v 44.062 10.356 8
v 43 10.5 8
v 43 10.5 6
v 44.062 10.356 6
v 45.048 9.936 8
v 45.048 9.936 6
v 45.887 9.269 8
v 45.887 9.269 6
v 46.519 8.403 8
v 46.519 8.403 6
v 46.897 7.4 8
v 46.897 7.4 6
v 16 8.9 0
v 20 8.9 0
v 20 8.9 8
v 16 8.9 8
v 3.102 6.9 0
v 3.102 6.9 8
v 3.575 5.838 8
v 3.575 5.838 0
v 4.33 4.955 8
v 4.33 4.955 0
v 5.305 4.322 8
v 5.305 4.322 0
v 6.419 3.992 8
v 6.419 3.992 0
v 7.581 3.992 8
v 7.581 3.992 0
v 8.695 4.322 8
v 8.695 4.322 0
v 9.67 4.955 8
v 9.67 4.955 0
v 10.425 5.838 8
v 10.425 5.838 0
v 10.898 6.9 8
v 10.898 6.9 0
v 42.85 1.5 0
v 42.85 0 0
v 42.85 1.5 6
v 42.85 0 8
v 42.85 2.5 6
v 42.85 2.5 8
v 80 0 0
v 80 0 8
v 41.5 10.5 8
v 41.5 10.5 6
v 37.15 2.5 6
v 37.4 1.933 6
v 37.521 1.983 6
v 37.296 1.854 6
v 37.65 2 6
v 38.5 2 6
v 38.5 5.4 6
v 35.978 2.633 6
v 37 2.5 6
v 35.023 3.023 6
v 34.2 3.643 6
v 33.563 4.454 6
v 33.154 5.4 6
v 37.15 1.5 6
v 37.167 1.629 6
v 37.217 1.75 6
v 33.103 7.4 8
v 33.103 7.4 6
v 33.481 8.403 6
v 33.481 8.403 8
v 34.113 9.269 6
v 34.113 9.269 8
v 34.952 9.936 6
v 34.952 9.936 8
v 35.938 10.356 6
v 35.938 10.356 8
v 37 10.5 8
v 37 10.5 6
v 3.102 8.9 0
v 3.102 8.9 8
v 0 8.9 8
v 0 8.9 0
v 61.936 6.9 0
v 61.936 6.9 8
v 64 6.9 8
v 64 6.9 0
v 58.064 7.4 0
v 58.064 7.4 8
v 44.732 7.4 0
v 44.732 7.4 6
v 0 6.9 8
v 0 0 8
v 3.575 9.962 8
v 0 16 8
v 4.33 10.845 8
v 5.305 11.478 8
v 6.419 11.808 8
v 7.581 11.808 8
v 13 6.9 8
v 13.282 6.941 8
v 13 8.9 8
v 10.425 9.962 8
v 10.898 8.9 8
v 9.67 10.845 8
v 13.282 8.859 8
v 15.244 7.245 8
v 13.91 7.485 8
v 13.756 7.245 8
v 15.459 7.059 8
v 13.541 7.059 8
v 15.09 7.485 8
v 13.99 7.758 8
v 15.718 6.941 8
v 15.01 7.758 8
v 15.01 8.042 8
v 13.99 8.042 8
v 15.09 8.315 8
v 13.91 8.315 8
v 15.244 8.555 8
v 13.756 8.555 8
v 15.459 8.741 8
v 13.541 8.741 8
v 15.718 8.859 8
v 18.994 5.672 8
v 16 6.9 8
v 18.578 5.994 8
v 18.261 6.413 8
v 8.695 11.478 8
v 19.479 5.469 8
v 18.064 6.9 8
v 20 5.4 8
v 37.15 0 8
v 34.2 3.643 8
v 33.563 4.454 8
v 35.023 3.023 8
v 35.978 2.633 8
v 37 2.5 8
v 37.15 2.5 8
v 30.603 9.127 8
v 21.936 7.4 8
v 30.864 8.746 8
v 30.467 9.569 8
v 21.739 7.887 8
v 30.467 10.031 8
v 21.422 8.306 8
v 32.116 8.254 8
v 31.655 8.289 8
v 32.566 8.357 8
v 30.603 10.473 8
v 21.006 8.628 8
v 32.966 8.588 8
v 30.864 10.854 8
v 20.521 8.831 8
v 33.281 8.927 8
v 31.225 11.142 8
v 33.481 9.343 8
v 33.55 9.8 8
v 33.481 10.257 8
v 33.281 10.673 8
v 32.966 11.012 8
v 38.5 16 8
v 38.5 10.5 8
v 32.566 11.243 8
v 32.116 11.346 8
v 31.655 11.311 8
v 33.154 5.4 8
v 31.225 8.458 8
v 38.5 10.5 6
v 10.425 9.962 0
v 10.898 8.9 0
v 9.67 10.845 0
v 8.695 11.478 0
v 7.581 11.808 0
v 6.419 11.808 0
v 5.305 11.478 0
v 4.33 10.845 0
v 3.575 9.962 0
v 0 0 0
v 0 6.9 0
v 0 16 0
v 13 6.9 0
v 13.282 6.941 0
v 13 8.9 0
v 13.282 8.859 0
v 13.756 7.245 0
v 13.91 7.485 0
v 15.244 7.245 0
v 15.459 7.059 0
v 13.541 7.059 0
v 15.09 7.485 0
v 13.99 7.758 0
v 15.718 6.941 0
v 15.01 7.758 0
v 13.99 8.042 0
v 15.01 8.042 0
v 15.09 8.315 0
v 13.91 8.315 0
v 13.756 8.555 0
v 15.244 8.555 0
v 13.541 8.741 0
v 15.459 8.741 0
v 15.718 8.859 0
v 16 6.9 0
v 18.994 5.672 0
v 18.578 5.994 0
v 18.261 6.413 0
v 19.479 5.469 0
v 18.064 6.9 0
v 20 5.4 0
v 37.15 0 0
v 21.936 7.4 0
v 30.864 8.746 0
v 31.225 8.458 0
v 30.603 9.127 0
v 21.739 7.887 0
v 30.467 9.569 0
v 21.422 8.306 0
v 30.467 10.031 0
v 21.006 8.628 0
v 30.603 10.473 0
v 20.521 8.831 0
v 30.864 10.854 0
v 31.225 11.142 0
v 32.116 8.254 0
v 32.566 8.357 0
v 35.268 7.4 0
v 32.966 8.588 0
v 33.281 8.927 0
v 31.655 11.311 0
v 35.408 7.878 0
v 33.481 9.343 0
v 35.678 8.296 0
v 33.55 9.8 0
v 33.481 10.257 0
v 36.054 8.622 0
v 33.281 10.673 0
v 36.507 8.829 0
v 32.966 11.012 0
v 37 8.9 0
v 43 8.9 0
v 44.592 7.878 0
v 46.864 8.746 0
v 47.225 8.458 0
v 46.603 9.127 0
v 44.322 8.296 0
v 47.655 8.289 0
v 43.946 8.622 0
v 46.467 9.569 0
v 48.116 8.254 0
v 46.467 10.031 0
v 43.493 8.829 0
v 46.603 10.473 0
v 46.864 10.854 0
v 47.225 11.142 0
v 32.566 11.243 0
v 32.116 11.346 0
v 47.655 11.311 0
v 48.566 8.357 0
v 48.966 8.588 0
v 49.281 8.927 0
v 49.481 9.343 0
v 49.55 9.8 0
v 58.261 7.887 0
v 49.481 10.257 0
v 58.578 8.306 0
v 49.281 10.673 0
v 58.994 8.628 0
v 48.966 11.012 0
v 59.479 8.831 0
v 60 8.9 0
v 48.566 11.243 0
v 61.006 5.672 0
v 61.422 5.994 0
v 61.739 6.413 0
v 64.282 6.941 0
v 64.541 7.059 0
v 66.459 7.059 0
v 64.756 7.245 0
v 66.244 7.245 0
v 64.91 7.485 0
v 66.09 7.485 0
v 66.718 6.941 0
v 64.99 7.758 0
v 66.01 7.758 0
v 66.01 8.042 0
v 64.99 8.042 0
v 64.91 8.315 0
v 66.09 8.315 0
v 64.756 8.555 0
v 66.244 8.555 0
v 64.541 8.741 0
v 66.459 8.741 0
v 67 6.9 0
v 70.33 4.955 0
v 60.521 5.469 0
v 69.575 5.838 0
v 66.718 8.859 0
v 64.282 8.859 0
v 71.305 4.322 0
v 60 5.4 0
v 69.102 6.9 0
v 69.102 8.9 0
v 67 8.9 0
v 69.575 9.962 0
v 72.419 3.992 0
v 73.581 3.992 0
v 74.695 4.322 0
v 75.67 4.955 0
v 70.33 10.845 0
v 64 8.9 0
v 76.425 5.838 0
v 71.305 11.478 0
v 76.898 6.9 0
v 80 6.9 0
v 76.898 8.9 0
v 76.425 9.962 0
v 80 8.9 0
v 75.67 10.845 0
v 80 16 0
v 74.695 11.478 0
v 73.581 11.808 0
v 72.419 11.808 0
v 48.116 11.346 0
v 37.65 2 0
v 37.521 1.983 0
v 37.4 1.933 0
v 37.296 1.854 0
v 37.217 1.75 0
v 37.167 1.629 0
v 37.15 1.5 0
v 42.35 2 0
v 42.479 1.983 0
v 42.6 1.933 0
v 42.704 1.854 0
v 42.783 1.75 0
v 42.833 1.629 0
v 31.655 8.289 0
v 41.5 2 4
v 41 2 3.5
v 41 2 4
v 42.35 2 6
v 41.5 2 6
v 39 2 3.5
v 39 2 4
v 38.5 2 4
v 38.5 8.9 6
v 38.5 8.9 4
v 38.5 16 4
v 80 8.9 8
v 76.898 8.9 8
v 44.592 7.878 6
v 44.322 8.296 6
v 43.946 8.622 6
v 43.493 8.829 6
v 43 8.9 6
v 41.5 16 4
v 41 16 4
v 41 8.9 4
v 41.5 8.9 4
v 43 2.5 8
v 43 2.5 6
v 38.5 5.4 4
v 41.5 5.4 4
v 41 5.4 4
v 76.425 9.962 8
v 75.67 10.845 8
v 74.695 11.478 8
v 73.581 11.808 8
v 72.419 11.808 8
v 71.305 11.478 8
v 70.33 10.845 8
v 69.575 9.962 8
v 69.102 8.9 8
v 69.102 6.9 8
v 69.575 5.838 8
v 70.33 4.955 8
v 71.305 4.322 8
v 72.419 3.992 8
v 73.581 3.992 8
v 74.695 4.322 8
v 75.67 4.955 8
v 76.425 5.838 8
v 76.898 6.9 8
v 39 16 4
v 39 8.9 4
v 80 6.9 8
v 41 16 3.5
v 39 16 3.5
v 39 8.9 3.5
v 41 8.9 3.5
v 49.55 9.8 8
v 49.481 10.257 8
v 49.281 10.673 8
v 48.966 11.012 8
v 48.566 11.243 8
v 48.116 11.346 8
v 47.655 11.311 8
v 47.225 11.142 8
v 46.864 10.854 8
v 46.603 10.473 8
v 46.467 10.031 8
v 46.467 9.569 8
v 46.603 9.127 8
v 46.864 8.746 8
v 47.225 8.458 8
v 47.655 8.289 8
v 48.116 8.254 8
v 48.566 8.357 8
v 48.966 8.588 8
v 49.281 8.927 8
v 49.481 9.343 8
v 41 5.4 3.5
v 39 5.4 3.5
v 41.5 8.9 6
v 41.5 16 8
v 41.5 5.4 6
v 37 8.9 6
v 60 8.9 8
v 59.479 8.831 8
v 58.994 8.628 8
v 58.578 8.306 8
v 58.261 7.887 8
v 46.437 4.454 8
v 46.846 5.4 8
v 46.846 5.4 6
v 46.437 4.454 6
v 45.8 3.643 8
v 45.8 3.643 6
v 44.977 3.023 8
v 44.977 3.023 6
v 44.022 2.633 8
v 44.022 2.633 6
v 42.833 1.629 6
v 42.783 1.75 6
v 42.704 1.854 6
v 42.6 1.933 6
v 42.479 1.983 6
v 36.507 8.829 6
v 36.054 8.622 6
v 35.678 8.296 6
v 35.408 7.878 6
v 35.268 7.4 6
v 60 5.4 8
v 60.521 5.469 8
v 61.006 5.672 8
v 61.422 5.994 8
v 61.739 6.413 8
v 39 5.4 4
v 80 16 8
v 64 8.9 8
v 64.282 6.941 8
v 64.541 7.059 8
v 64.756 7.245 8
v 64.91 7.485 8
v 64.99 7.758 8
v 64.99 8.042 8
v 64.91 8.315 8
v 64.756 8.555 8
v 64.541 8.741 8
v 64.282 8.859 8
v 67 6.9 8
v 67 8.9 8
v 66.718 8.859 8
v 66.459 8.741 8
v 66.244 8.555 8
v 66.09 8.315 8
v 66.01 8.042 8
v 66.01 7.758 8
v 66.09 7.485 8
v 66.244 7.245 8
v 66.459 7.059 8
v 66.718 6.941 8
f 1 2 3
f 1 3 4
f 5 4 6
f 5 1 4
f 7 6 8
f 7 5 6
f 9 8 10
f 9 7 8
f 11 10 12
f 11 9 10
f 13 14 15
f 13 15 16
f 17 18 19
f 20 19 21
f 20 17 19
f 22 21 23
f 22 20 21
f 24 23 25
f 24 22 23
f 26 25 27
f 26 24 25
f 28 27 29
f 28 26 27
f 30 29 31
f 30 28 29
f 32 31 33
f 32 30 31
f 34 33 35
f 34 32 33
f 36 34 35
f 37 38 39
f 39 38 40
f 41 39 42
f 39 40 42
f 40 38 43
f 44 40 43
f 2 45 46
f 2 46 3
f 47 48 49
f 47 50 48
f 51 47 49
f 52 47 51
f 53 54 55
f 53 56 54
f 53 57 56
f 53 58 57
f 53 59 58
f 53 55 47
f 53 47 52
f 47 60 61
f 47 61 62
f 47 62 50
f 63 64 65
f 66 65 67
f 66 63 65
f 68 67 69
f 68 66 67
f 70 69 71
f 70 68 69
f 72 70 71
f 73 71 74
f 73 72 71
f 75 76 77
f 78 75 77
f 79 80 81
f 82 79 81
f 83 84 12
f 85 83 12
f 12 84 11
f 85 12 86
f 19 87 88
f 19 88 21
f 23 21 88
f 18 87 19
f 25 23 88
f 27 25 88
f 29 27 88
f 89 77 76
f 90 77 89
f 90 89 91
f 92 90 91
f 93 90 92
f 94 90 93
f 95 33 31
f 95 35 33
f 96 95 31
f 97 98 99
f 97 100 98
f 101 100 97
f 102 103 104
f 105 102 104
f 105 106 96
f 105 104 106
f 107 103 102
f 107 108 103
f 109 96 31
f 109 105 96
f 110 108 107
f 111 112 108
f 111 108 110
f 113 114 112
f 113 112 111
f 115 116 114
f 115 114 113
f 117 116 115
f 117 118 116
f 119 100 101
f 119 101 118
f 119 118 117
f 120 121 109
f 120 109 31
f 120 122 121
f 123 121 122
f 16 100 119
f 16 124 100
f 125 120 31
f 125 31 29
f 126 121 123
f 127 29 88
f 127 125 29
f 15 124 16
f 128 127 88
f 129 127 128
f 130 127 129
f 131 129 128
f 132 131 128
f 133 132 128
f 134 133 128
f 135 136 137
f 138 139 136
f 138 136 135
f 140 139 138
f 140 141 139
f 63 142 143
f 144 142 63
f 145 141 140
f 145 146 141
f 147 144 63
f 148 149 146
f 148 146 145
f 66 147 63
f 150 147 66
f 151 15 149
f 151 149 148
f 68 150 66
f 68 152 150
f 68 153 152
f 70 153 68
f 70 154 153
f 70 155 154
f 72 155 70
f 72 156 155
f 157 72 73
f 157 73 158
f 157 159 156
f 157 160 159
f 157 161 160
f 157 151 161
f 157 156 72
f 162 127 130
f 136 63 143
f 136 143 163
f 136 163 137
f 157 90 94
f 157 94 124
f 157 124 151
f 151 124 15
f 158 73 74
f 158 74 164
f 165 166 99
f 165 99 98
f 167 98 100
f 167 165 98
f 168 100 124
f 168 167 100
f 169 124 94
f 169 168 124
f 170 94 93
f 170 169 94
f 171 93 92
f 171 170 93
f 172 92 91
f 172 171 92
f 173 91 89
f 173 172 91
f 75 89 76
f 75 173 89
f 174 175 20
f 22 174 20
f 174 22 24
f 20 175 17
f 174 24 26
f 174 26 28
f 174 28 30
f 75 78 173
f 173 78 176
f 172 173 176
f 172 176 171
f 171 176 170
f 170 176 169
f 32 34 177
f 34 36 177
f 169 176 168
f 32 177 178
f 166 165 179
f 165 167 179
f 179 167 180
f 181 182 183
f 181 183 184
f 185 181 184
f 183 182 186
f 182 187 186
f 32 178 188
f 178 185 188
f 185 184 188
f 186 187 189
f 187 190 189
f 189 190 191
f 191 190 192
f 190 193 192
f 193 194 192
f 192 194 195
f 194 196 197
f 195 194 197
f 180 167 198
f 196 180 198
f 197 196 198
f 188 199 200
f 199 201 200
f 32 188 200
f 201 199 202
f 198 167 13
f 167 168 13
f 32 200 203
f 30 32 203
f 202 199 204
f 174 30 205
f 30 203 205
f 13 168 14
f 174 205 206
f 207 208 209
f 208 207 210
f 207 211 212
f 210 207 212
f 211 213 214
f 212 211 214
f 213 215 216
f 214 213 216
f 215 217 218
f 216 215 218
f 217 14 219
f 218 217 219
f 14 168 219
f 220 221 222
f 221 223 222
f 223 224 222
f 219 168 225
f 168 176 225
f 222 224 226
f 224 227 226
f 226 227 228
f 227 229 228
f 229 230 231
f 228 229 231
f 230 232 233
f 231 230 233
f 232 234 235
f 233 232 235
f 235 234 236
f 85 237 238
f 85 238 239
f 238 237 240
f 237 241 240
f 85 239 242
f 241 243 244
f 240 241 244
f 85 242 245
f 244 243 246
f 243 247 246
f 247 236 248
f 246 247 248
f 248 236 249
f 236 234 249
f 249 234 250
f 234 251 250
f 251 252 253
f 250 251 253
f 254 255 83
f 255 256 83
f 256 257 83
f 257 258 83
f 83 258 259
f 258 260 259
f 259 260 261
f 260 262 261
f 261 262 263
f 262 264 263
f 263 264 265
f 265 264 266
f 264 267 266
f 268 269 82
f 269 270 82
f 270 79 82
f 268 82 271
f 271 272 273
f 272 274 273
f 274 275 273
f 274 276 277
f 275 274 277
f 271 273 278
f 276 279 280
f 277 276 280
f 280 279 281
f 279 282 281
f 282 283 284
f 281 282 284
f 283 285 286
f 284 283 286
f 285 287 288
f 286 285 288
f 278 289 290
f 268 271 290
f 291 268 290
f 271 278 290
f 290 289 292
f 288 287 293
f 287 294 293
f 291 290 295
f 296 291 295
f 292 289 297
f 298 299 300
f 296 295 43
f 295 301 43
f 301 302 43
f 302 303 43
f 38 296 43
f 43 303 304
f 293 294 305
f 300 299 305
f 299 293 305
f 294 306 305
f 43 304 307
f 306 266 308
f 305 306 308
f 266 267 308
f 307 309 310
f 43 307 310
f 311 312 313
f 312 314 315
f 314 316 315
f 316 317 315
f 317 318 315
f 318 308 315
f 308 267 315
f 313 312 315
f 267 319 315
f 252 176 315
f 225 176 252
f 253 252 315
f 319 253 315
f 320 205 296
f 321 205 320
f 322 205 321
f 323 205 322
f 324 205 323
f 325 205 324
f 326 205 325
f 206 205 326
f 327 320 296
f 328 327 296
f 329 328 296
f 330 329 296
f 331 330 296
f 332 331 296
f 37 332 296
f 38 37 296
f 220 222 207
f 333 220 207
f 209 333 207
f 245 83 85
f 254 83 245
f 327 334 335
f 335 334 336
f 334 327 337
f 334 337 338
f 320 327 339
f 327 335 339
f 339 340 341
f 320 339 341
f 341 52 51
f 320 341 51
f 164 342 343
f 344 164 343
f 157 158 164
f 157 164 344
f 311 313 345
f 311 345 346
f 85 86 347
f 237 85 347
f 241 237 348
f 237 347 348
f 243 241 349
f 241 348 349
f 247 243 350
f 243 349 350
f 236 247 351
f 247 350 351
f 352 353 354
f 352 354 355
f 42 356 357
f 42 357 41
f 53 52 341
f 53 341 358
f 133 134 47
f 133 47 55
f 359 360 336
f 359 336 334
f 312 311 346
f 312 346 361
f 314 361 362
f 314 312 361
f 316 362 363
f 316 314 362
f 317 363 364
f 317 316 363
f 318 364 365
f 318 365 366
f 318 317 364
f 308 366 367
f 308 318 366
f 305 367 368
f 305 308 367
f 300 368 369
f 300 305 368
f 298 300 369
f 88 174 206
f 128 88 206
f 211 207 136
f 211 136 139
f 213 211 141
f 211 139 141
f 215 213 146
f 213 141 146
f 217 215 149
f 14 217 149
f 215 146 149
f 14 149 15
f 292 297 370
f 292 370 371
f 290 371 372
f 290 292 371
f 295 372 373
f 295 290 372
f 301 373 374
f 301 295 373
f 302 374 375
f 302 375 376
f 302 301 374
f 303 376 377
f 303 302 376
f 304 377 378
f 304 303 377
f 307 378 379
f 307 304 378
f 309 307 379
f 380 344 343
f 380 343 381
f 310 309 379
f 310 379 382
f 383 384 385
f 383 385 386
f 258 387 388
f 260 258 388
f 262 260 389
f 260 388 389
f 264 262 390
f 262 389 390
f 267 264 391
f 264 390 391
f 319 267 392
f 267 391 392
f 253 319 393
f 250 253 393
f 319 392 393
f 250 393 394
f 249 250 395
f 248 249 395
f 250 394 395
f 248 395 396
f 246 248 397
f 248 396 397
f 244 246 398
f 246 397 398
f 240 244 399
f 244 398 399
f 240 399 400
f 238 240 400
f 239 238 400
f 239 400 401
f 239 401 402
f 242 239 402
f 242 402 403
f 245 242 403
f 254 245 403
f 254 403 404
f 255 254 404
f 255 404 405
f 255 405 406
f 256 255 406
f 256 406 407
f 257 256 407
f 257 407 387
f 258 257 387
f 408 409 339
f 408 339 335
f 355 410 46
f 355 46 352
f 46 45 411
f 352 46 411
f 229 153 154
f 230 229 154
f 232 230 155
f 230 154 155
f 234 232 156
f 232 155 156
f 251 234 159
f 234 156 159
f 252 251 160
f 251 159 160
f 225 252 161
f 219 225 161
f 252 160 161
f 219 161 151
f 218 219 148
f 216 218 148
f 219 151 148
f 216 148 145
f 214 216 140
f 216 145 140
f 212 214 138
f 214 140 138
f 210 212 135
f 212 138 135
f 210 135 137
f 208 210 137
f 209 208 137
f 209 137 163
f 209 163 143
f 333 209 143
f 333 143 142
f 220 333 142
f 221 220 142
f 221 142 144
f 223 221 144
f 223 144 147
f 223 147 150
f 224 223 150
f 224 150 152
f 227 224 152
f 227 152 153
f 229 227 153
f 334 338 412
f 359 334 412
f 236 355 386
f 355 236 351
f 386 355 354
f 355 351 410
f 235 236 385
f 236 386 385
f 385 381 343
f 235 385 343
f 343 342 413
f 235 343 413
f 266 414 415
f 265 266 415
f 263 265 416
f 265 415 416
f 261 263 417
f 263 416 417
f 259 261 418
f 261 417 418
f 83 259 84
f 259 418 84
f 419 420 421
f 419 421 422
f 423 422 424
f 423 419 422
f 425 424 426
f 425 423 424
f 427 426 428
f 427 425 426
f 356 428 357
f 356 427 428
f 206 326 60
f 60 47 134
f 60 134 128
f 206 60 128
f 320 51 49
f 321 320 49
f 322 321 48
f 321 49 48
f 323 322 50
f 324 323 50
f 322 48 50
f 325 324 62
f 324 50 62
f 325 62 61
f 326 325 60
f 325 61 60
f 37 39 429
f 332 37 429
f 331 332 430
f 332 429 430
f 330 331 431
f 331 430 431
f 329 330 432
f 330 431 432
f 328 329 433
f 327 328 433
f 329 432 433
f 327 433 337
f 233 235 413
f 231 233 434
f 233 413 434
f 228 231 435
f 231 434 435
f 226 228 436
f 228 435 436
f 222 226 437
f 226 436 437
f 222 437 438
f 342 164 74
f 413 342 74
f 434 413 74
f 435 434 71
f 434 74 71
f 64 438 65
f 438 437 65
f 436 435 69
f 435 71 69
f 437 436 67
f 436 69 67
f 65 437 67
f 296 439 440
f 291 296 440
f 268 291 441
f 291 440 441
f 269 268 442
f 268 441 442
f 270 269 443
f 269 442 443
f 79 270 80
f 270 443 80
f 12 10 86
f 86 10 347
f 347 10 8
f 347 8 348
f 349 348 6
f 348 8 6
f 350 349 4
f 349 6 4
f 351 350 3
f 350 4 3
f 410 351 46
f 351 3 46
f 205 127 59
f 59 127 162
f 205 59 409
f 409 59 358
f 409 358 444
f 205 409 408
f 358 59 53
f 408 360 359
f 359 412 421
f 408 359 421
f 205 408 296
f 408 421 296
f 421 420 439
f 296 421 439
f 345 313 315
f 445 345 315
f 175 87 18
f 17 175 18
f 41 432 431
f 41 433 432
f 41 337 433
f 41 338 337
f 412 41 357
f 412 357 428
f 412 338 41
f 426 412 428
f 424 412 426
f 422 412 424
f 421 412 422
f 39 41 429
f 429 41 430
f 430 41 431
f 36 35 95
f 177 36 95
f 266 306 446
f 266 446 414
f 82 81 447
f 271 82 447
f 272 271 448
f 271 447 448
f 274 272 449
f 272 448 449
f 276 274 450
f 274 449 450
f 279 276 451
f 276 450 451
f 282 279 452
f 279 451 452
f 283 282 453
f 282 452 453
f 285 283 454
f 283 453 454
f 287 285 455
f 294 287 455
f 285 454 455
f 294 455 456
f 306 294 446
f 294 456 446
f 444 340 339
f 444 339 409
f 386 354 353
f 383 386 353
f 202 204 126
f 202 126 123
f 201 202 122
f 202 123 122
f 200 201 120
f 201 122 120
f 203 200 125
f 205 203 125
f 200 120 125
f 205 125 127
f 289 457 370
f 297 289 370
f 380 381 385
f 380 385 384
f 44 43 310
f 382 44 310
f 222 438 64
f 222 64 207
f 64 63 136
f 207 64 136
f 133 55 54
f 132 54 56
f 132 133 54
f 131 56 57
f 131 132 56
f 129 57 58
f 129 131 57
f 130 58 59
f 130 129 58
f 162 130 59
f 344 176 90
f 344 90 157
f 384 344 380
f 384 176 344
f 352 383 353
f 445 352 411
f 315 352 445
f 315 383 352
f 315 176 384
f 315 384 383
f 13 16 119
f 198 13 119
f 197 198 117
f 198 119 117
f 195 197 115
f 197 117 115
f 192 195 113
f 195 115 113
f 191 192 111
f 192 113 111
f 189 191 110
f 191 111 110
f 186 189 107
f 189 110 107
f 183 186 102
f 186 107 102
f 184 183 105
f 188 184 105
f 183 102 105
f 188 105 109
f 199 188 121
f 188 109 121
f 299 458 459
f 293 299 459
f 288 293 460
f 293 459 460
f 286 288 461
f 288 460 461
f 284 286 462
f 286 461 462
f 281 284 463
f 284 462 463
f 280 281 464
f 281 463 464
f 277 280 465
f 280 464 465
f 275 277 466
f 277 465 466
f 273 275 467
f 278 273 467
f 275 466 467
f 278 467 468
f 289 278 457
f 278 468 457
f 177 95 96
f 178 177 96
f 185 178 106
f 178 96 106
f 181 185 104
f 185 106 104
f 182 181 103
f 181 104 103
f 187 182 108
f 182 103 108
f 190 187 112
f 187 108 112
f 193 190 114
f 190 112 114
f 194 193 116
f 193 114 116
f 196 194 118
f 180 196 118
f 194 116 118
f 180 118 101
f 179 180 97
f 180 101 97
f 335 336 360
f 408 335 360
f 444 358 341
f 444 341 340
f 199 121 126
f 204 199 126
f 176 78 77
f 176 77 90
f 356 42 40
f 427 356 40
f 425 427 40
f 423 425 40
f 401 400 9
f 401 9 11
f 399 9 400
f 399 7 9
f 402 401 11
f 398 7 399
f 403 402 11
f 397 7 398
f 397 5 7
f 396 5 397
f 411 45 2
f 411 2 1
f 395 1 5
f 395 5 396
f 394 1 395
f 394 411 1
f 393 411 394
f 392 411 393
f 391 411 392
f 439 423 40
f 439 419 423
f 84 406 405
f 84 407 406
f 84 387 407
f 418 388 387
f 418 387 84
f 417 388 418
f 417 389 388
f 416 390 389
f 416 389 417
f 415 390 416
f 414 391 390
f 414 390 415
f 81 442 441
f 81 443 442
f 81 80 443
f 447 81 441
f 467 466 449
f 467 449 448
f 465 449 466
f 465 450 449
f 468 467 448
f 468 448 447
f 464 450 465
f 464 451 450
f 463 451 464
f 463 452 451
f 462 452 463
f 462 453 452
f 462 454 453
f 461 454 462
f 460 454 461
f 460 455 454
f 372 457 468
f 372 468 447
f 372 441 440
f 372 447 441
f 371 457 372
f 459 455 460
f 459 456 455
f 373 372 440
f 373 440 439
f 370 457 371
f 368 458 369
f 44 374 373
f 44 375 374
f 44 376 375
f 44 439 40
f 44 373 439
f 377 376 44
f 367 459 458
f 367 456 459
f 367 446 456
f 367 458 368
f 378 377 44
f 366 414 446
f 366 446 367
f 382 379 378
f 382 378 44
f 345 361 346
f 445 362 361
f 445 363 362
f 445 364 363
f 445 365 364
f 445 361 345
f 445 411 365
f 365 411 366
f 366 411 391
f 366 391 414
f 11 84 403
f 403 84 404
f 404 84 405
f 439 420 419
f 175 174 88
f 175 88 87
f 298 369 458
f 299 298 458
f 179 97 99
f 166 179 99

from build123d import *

# Parameters (mm, degrees)
SKETCH_2_W           = 80
SKETCH_2_H           = 16
EXTRUDE_1_DEPTH      = 8
SKETCH_5_R           = 1.55
CUT_EXTRUDE_3_DEPTH  = 82.975606128
CUT_EXTRUDE_4_DEPTH  = 82.975606128
SKETCH_8_W           = 3
SKETCH_8_H           = 16
CUT_EXTRUDE_5_DEPTH  = 4
SKETCH_9_R           = 0.5
CUT_EXTRUDE_6_DEPTH  = 82.975606128
CUT_EXTRUDE_7_DEPTH  = 2
CUT_EXTRUDE_8_DEPTH  = 82.975606128
SKETCH_12_W          = 5.7
SKETCH_12_H          = 2.5
CUT_EXTRUDE_9_DEPTH  = 2
SKETCH_13_W          = 2
SKETCH_13_H          = 14
CUT_EXTRUDE_10_DEPTH = 0.5


with BuildPart() as part:
    # 草图2 → 凸台-拉伸1 (new body)
    with BuildSketch(Plane.XY):
        with Locations((40, 8)):
            Rectangle(SKETCH_2_W, SKETCH_2_H)
        with BuildLine():
            ThreePointArc((11.048765244, 7.9), (7, 11.85), (2.951234756, 7.9))
            ThreePointArc((2.951234756, 7.9), (7, 3.95), (11.048765244, 7.9))
        make_face(mode=Mode.SUBTRACT)
        with BuildLine():
            ThreePointArc((77.048765244, 7.9), (73, 11.85), (68.951234756, 7.9))
            ThreePointArc((68.951234756, 7.9), (73, 3.95), (77.048765244, 7.9))
        make_face(mode=Mode.SUBTRACT)
    extrude(amount=EXTRUDE_1_DEPTH)

    # 草图5 → 切除-拉伸3 (cut, through all)
    with BuildSketch(Plane.XY.offset(8)):
        with Locations((48, 9.8)):
            Circle(SKETCH_5_R)
        with Locations((32, 9.8)):
            Circle(SKETCH_5_R)
    extrude(amount=-CUT_EXTRUDE_3_DEPTH, mode=Mode.SUBTRACT)

    # 草图6 → 切除-拉伸4 (cut, through all)
    with BuildSketch(Plane.XY.offset(8)):
        with BuildLine():
            Line((3.102244235, 8.9), (0, 8.9))
            Line((0, 8.9), (0, 6.9))
            Line((0, 6.9), (3.102244235, 6.9))
            ThreePointArc((3.102244235, 6.9), (2.995402762, 7.395267856), (2.951234756, 7.9))
            ThreePointArc((2.951234756, 7.9), (2.995402762, 8.404732144), (3.102244235, 8.9))
        make_face()
        with BuildLine():
            ThreePointArc((60, 5.4), (61.224744871, 5.81886117), (61.936491673, 6.9))
            Line((61.936491673, 6.9), (64, 6.9))
            ThreePointArc((64, 6.9), (65, 7.9), (64, 8.9))
            Line((64, 8.9), (60, 8.9))
            ThreePointArc((60, 8.9), (58.775255129, 8.48113883), (58.063508327, 7.4))
            Line((58.063508327, 7.4), (21.936491673, 7.4))
            ThreePointArc((21.936491673, 7.4), (21.224744871, 8.48113883), (20, 8.9))
            Line((20, 8.9), (16, 8.9))
            ThreePointArc((16, 8.9), (15, 7.9), (16, 6.9))
            Line((16, 6.9), (18.063508327, 6.9))
            ThreePointArc((18.063508327, 6.9), (18.775255129, 5.81886117), (20, 5.4))
            Line((20, 5.4), (60, 5.4))
        make_face()
        with BuildLine():
            Line((76.897755765, 6.9), (80, 6.9))
            Line((80, 6.9), (80, 8.9))
            Line((80, 8.9), (76.897755765, 8.9))
            ThreePointArc((76.897755765, 8.9), (77.004597237, 8.404732144), (77.048765244, 7.9))
            ThreePointArc((77.048765244, 7.9), (77.004597237, 7.395267856), (76.897755765, 6.9))
        make_face()
        with BuildLine():
            Line((67, 6.9), (69.102244235, 6.9))
            ThreePointArc((69.102244235, 6.9), (68.995402763, 7.395267856), (68.951234756, 7.9))
            ThreePointArc((68.951234756, 7.9), (68.995402763, 8.404732144), (69.102244235, 8.9))
            Line((69.102244235, 8.9), (67, 8.9))
            ThreePointArc((67, 8.9), (66, 7.9), (67, 6.9))
        make_face()
        with BuildLine():
            Line((13, 8.9), (10.897755764, 8.9))
            ThreePointArc((10.897755764, 8.9), (11.004597237, 8.404732144), (11.048765244, 7.9))
            ThreePointArc((11.048765244, 7.9), (11.004597237, 7.395267856), (10.897755764, 6.9))
            Line((10.897755764, 6.9), (13, 6.9))
            ThreePointArc((13, 6.9), (14, 7.9), (13, 8.9))
        make_face()
    extrude(amount=-CUT_EXTRUDE_4_DEPTH, mode=Mode.SUBTRACT)

    # 草图8 → 切除-拉伸5 (cut)
    with BuildSketch(Plane.XY.offset(8)):
        with Locations((40, 8)):
            Rectangle(SKETCH_8_W, SKETCH_8_H)
    extrude(amount=-CUT_EXTRUDE_5_DEPTH, mode=Mode.SUBTRACT)

    # 草图9 → 切除-拉伸6 (cut, through all)
    with BuildSketch(Plane.XY.offset(8)):
        with Locations((37.65, 1.5)):
            Circle(SKETCH_9_R)
        with Locations((42.35, 1.5)):
            Circle(SKETCH_9_R)
        with BuildLine():
            Line((38.5, 2), (38.5, 0))
            Line((38.5, 0), (42.85, 0))
            Line((42.85, 0), (42.85, 1.5))
            ThreePointArc((42.85, 1.5), (41.996446609, 1.146446609), (42.35, 2))
            Line((42.35, 2), (38.5, 2))
        make_face()
        with BuildLine():
            Line((37.15, 1.5), (37.15, 0))
            Line((37.15, 0), (38.5, 0))
            Line((38.5, 0), (38.5, 2))
            Line((38.5, 2), (37.65, 2))
            ThreePointArc((37.65, 2), (38.003553391, 1.853553391), (38.15, 1.5))
            ThreePointArc((38.15, 1.5), (37.65, 1), (37.15, 1.5))
        make_face()
    extrude(amount=-CUT_EXTRUDE_6_DEPTH, mode=Mode.SUBTRACT)

    # 草图10 → 切除-拉伸7 (cut)
    with BuildSketch(Plane.XY.offset(8)):
        with BuildLine():
            Line((37, 10.5), (43, 10.5))
            ThreePointArc((43, 10.5), (47, 6.5), (43, 2.5))
            Line((43, 2.5), (37, 2.5))
            ThreePointArc((37, 2.5), (33, 6.5), (37, 10.5))
        make_face()
    extrude(amount=-CUT_EXTRUDE_7_DEPTH, mode=Mode.SUBTRACT)

    # 草图11 → 切除-拉伸8 (cut, through all)
    with BuildSketch(Plane.XY.offset(8)):
        with BuildLine():
            Line((37, 5.4), (43, 5.4))
            ThreePointArc((43, 5.4), (44.75, 7.15), (43, 8.9))
            Line((43, 8.9), (37, 8.9))
            ThreePointArc((37, 8.9), (35.25, 7.15), (37, 5.4))
        make_face()
    extrude(amount=-CUT_EXTRUDE_8_DEPTH, mode=Mode.SUBTRACT)

    # 草图12 → 切除-拉伸9 (cut)
    with BuildSketch(Plane.XY.offset(8)):
        with Locations((40, 1.25)):
            Rectangle(SKETCH_12_W, SKETCH_12_H)
    extrude(amount=-CUT_EXTRUDE_9_DEPTH, mode=Mode.SUBTRACT)

    # 草图13 → 切除-拉伸10 (cut)
    with BuildSketch(Plane.XY.offset(4)):
        with Locations((40, 9)):
            Rectangle(SKETCH_13_W, SKETCH_13_H)
    extrude(amount=-CUT_EXTRUDE_10_DEPTH, mode=Mode.SUBTRACT)


solid = part.part
